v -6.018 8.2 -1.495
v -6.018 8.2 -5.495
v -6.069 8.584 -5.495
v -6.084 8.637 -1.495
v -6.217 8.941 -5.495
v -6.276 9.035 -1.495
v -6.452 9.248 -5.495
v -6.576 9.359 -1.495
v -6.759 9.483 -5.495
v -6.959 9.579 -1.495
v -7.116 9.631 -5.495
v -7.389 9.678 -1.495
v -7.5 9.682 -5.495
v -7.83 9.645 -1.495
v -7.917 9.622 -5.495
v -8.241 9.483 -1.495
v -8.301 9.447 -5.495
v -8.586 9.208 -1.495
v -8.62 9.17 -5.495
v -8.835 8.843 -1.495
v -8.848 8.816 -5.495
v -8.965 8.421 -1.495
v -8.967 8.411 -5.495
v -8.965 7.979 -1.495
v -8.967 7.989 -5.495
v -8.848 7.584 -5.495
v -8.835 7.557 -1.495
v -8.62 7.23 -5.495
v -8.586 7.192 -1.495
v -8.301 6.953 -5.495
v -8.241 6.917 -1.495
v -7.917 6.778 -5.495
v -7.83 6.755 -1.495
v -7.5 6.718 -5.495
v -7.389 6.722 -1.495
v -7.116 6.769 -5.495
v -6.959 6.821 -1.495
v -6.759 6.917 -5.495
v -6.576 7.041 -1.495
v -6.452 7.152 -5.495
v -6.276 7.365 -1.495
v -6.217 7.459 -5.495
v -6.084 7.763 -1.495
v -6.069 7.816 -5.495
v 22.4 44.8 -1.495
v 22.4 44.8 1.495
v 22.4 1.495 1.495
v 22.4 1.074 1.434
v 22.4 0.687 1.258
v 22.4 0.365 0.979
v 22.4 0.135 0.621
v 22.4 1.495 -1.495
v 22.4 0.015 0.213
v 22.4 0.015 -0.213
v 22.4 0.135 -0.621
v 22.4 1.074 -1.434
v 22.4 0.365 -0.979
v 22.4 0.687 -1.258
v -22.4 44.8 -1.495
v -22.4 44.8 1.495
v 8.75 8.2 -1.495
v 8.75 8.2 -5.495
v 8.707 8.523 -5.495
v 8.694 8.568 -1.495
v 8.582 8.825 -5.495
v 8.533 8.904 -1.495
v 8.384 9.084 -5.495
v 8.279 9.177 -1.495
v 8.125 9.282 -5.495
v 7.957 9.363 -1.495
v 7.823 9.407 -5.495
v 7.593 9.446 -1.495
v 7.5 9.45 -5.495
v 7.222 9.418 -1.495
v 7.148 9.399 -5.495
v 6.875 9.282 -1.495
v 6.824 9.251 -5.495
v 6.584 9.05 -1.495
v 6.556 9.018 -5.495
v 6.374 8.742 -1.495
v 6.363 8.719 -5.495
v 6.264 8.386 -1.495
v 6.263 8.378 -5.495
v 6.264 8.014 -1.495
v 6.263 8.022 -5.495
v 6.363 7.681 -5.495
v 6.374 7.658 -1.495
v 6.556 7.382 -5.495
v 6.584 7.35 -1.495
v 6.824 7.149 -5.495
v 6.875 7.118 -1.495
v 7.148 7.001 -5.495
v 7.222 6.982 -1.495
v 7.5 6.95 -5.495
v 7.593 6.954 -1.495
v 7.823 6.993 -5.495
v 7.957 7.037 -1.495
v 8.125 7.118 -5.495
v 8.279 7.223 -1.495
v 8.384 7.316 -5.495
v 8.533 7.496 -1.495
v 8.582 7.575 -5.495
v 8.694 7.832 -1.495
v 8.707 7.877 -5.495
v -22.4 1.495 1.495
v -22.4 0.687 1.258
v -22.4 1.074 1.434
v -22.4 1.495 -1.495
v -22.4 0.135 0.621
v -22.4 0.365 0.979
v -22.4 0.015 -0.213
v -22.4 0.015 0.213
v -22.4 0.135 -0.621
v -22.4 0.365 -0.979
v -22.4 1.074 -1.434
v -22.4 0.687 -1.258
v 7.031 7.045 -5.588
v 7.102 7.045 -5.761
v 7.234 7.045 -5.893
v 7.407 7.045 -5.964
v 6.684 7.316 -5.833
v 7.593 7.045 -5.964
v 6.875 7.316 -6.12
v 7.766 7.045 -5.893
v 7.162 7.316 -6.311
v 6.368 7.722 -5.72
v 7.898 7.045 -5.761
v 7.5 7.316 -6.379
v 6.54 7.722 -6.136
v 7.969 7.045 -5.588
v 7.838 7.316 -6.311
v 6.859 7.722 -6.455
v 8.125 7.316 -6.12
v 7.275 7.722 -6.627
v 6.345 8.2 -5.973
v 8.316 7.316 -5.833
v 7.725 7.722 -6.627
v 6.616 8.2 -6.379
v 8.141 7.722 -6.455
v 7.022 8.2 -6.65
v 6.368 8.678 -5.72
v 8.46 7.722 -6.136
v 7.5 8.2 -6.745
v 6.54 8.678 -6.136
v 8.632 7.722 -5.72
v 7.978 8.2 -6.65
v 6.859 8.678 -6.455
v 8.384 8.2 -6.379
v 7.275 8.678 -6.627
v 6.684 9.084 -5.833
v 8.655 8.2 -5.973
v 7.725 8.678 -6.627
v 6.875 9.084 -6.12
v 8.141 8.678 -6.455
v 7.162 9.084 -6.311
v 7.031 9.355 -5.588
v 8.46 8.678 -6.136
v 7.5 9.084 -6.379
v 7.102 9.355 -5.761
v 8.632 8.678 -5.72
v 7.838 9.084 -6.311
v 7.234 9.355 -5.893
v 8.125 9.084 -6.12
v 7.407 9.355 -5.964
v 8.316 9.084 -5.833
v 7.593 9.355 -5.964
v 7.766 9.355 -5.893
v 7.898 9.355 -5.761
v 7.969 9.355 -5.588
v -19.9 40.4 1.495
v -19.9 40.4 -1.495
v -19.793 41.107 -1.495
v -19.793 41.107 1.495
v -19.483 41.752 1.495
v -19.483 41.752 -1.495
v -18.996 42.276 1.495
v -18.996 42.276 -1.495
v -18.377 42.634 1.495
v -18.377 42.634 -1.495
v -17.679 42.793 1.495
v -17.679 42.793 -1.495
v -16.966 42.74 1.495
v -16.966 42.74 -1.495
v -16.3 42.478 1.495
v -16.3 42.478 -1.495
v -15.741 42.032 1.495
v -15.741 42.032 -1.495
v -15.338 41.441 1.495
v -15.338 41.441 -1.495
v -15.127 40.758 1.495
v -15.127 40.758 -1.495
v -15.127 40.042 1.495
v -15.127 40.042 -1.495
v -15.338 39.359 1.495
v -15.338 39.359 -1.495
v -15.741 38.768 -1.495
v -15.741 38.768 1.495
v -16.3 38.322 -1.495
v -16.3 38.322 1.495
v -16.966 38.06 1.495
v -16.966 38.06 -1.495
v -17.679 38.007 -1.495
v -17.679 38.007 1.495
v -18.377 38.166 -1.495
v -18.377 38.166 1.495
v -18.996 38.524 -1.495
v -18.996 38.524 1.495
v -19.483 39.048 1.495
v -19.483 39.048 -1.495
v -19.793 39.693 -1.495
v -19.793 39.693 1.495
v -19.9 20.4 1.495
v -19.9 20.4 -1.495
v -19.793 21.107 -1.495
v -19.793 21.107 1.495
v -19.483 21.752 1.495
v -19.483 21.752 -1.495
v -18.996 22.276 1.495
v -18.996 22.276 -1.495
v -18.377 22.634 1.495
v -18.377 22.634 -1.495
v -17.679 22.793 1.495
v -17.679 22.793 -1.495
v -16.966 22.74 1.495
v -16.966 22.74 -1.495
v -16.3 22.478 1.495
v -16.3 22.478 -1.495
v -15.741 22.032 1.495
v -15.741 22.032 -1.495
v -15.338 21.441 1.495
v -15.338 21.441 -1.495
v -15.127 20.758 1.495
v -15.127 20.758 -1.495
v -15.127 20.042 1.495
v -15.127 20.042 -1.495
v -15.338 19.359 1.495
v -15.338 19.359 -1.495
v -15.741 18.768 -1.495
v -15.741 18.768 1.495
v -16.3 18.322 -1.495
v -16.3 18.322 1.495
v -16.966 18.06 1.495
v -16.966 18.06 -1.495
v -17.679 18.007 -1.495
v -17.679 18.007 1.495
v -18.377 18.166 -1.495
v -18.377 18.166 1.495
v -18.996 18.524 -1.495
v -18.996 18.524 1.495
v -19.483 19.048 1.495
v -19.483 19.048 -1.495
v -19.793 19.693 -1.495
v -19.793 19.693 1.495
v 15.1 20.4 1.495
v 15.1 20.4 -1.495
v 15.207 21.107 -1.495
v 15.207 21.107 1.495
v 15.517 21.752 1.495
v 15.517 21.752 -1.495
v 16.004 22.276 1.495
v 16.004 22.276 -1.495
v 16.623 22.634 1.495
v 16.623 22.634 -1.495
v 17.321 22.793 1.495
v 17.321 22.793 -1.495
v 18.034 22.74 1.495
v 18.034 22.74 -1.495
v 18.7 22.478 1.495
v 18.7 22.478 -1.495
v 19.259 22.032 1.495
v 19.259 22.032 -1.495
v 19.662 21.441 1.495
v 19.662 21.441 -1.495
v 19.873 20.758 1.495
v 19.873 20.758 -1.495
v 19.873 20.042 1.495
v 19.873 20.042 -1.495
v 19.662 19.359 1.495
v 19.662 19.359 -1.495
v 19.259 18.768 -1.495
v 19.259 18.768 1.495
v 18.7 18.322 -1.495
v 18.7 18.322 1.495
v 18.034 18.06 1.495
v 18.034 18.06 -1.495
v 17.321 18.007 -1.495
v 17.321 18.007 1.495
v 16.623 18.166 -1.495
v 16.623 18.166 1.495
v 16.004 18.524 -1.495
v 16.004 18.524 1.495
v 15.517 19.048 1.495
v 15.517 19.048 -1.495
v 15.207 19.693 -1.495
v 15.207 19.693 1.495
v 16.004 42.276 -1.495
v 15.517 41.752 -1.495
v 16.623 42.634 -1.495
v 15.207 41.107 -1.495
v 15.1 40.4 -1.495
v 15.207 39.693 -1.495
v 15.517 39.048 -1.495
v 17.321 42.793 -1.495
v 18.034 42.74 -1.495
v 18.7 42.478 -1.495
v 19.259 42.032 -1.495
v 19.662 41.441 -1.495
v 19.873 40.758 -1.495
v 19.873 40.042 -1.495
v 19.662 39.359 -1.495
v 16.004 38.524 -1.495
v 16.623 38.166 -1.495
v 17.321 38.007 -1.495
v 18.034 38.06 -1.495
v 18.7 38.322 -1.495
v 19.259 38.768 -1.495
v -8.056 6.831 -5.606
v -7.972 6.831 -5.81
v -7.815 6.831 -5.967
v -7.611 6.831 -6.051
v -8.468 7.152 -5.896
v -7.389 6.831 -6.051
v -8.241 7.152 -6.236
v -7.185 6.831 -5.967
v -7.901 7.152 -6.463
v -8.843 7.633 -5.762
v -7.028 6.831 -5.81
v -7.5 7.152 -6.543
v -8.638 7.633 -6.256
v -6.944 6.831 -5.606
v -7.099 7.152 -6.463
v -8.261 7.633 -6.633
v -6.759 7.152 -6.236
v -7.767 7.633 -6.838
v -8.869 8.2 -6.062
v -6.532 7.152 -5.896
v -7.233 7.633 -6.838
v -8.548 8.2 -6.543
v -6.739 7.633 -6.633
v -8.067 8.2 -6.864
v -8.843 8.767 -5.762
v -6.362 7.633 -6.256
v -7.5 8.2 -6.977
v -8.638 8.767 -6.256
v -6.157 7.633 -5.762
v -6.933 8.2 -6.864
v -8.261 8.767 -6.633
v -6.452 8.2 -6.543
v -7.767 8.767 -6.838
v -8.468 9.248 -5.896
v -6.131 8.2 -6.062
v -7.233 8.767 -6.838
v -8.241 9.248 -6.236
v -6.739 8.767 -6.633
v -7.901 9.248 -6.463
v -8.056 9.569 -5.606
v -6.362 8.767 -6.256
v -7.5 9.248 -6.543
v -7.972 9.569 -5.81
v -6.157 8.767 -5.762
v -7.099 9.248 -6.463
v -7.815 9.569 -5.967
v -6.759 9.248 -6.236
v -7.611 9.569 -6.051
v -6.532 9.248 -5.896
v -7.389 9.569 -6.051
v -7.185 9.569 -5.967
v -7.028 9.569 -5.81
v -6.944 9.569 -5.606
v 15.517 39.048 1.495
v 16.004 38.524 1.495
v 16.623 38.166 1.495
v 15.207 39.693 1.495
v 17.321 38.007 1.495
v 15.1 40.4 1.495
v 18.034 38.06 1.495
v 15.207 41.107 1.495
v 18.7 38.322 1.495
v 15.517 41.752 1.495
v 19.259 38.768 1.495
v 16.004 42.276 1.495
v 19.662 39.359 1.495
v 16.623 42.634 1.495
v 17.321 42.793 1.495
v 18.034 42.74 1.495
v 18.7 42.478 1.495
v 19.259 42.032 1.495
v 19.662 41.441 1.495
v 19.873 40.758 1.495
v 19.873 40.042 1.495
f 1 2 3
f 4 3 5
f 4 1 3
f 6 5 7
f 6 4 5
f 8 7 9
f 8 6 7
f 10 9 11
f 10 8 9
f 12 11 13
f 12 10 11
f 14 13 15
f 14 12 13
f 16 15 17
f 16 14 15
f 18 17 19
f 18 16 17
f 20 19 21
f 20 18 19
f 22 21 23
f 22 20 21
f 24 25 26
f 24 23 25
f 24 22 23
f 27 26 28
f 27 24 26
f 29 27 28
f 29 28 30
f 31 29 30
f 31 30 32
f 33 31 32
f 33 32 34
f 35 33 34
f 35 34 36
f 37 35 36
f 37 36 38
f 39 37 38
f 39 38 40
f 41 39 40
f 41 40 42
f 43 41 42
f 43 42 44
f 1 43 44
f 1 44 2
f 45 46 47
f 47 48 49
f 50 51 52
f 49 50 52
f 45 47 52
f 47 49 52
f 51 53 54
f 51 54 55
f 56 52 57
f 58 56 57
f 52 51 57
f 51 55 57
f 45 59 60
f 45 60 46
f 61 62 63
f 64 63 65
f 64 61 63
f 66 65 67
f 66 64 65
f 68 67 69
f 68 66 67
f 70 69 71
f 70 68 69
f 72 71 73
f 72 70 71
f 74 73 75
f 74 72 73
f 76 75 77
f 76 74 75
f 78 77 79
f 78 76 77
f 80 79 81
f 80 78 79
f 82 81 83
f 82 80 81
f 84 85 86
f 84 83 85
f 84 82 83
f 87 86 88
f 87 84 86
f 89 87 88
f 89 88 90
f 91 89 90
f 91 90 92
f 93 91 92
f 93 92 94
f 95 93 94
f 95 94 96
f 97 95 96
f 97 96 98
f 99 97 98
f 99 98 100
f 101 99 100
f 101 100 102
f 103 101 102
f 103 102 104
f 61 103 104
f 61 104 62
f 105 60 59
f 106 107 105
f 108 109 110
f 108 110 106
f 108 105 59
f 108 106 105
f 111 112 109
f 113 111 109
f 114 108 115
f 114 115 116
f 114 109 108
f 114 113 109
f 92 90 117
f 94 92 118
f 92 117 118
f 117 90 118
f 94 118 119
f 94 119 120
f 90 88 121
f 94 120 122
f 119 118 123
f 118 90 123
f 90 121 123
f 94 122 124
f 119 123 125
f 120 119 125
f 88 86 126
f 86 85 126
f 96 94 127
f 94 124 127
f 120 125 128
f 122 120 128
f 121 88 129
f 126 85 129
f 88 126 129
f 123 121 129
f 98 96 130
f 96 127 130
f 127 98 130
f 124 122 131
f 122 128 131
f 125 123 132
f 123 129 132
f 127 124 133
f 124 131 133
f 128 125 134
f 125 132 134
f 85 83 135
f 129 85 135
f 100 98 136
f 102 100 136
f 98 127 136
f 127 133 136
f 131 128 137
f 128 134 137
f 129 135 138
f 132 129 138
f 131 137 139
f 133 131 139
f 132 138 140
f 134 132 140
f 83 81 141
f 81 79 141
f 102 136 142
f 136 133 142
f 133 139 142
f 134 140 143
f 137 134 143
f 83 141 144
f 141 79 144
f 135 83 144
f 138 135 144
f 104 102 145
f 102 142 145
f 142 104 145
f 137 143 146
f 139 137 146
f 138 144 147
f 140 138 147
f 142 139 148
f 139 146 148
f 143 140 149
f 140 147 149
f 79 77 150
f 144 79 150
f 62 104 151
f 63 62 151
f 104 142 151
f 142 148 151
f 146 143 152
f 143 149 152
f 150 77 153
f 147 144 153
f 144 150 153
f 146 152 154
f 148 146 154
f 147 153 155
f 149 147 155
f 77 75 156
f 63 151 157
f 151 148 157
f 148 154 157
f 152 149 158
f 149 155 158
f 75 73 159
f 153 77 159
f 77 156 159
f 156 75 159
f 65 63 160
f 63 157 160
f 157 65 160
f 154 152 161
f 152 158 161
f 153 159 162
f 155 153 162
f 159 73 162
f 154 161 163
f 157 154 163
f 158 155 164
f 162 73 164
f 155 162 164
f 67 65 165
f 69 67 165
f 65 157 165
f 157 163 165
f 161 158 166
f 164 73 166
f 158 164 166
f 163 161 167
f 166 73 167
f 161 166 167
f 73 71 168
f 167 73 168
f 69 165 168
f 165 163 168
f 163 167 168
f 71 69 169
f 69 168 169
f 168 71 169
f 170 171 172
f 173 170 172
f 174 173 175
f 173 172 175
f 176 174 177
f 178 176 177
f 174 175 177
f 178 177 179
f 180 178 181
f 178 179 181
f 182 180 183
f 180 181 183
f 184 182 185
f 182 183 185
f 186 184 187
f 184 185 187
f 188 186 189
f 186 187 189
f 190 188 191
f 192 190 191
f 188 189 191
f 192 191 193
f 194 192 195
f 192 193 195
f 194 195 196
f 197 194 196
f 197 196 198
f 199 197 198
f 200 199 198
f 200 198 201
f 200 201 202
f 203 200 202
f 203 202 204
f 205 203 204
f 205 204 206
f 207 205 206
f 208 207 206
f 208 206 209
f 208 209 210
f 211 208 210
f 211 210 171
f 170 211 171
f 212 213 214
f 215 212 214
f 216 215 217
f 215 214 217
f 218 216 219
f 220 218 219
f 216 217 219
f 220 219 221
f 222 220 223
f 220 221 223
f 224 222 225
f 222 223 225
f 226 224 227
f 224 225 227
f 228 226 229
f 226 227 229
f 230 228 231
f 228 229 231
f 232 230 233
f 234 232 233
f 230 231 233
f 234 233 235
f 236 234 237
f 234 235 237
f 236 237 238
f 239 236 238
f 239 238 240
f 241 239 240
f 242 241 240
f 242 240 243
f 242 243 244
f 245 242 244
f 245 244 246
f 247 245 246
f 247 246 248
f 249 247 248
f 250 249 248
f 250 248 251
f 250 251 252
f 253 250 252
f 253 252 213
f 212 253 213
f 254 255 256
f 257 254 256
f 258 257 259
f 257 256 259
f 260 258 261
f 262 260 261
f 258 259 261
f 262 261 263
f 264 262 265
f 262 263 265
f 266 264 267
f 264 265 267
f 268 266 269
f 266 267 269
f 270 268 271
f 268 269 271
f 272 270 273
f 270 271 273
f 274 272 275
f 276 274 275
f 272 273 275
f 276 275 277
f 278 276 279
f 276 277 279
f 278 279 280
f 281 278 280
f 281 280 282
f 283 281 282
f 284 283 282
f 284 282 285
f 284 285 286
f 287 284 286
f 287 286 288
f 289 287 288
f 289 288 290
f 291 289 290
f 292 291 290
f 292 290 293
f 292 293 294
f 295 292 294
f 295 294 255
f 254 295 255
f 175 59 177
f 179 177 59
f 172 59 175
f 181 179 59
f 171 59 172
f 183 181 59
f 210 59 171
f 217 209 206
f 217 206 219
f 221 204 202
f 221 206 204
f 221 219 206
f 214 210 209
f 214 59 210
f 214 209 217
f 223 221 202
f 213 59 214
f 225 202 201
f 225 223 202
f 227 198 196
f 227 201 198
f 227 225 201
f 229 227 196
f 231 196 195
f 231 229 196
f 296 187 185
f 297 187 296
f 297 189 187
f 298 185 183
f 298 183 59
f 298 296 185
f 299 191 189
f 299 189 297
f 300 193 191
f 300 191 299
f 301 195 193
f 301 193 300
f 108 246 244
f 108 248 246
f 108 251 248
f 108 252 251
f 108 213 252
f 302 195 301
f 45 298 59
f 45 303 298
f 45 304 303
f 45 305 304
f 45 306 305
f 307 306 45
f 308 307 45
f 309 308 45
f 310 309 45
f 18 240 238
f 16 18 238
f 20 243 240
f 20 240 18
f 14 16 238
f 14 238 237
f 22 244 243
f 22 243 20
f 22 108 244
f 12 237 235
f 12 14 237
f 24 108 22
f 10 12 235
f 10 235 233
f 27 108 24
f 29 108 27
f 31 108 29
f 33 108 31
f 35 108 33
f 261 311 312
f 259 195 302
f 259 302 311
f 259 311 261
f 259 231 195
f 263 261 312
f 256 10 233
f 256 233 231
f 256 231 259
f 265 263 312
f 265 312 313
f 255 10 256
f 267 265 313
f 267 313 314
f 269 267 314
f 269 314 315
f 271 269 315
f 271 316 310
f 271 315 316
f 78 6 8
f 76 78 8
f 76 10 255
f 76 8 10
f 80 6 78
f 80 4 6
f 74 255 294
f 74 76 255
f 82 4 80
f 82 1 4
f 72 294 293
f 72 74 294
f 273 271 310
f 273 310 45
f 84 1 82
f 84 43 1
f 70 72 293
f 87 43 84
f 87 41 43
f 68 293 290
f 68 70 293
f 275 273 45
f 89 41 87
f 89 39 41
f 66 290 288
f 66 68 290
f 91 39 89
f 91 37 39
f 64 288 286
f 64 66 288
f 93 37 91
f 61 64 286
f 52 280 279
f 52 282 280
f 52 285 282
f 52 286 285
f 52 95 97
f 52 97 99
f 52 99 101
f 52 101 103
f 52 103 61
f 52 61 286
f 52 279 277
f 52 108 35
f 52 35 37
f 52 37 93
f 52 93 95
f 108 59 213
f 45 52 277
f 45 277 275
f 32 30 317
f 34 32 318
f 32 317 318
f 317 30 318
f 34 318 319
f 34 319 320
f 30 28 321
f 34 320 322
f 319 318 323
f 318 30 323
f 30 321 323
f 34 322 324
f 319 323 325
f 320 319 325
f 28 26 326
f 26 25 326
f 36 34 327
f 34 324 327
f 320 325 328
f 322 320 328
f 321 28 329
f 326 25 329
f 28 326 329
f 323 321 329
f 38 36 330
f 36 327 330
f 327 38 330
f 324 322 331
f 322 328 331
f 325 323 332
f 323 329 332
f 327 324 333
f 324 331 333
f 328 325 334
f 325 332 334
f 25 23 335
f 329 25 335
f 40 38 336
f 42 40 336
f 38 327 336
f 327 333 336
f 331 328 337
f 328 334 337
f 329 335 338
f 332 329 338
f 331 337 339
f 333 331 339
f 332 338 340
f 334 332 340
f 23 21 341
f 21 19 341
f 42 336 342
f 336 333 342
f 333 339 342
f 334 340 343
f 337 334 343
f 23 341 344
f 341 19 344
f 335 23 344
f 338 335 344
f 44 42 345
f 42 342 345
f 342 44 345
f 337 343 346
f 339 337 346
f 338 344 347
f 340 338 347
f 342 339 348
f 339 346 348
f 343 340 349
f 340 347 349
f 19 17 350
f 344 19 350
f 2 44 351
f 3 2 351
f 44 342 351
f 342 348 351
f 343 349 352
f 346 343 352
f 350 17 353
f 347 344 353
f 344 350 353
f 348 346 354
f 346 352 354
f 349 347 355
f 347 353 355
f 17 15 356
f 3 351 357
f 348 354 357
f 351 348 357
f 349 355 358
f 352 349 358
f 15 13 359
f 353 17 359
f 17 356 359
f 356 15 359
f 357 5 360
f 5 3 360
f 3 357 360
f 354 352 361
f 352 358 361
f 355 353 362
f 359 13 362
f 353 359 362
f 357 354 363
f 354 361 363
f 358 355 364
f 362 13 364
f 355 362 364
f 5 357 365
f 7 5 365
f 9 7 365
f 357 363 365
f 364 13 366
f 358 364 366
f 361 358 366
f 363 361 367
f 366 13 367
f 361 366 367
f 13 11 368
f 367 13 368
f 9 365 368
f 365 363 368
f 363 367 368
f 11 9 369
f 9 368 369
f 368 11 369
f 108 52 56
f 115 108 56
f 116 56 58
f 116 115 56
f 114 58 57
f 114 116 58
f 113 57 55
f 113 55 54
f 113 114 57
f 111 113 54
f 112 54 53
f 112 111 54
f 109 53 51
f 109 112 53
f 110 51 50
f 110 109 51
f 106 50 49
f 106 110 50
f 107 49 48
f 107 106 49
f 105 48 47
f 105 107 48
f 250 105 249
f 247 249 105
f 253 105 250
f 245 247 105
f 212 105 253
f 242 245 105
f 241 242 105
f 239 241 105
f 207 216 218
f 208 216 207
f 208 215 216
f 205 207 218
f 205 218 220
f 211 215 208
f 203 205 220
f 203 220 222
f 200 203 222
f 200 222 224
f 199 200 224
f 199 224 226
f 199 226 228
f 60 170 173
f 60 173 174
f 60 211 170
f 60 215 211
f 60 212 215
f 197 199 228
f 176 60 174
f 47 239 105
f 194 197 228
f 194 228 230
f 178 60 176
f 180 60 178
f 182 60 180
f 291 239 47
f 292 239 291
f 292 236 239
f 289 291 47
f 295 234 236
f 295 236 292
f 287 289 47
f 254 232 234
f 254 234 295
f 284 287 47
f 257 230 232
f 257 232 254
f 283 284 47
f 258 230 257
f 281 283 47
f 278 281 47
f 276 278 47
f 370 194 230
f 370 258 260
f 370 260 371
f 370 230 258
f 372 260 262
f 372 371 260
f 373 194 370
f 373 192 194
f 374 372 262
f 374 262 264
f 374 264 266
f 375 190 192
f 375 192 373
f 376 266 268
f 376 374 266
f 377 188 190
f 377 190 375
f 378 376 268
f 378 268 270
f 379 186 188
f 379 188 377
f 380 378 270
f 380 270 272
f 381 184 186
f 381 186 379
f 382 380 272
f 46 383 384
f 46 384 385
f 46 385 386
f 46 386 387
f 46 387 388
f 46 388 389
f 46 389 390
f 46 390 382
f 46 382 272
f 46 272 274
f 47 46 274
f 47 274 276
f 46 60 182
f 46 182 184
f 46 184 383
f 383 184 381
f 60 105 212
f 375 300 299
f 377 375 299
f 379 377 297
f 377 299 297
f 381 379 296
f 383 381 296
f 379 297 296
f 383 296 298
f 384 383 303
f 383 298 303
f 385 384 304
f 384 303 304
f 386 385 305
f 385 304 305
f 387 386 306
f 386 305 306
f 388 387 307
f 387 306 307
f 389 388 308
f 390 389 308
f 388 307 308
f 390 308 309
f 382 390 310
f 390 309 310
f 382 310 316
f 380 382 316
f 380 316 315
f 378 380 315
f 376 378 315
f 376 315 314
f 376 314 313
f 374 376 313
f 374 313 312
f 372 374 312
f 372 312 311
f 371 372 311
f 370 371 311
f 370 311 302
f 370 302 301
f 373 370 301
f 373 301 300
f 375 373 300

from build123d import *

# Parameters (mm, degrees)
SKETCH1_W            = 44.8
SKETCH1_H            = 2.99
BOSS_EXTRUDE1_DEPTH  = 44.8
FILLET1_RADIUS       = 1.495
FILLET1_LENGTH       = 44.8
M4_CLEARANCE_HOLE1_D = 4.8
SKETCH8_R            = 1.481852537
SKETCH8_R_2          = 1.249642824
BOSS_EXTRUDE2_DEPTH  = 6.99
REVOLVE1_ANGLE       = 180
REVOLVE2_ANGLE       = 180


with BuildPart() as part:
    # Sketch1 → Boss-Extrude1 (new body)
    with BuildSketch(Plane(origin=(0, 0, 0), x_dir=(1, 0, 0), z_dir=(0, 1, 0))):
        Rectangle(SKETCH1_W, SKETCH1_H)
    extrude(amount=BOSS_EXTRUDE1_DEPTH)

    # Fillet1: full round fillet: the end face becomes a half cylinder, R = half its width
    fillet1_face = Plane((0, 0, 0), x_dir=(-1, 0, 0), z_dir=(0, -1, 0))  # on the end face: x along it, z out of the body
    fillet1_slab = fillet1_face.offset(-FILLET1_RADIUS / 2) * Box(FILLET1_LENGTH, 2 * FILLET1_RADIUS, FILLET1_RADIUS, mode=Mode.PRIVATE)  # the body's end, R deep
    fillet1_round = Plane((0, 1.495, 0), x_dir=(0, -1, 0), z_dir=(-1, 0, 0)) * Cylinder(FILLET1_RADIUS, FILLET1_LENGTH, mode=Mode.PRIVATE)  # its axis R under the face
    add(fillet1_slab - fillet1_round, mode=Mode.SUBTRACT)

    # M4 Clearance Hole1 (through all)
    with Locations(Plane.XY.offset(1.495)):
        with Locations((-17.5, 40.4), (-17.5, 20.4), (17.5, 20.4), (17.5, 40.4)):
            Hole(M4_CLEARANCE_HOLE1_D / 2)

    # Sketch8 → Boss-Extrude2 (add)
    with BuildSketch(Plane.XY.offset(1.495)):
        with Locations((-7.5, 8.2)):
            Circle(SKETCH8_R)
        with Locations((7.5, 8.2)):
            Circle(SKETCH8_R_2)
    extrude(amount=-BOSS_EXTRUDE2_DEPTH)

    # Sketch9 → Revolve1 (revolve)
    with BuildSketch(Plane(origin=(0, 0, -5.495), x_dir=(-1, 0, 0), z_dir=(0, 0, -1))):
        with BuildLine():
            Line((7.5, 9.681852537), (7.5, 6.718147463))
            ThreePointArc((7.5, 6.718147463), (8.981852537, 8.2), (7.5, 9.681852537))
        make_face()
    revolve(axis=Axis((-7.5, 9.681852537, -5.495), (0, -1, 0)), revolution_arc=REVOLVE1_ANGLE)

    # Sketch10 → Revolve2 (revolve)
    with BuildSketch(Plane(origin=(0, 0, -5.495), x_dir=(-1, 0, 0), z_dir=(0, 0, -1))):
        with BuildLine():
            Line((-7.5, 9.449642824), (-7.5, 6.950357176))
            ThreePointArc((-7.5, 6.950357176), (-6.250357176, 8.2), (-7.5, 9.449642824))
        make_face()
    revolve(axis=Axis((7.5, 9.449642824, -5.495), (0, -1, 0)), revolution_arc=REVOLVE2_ANGLE)


solid = part.part
